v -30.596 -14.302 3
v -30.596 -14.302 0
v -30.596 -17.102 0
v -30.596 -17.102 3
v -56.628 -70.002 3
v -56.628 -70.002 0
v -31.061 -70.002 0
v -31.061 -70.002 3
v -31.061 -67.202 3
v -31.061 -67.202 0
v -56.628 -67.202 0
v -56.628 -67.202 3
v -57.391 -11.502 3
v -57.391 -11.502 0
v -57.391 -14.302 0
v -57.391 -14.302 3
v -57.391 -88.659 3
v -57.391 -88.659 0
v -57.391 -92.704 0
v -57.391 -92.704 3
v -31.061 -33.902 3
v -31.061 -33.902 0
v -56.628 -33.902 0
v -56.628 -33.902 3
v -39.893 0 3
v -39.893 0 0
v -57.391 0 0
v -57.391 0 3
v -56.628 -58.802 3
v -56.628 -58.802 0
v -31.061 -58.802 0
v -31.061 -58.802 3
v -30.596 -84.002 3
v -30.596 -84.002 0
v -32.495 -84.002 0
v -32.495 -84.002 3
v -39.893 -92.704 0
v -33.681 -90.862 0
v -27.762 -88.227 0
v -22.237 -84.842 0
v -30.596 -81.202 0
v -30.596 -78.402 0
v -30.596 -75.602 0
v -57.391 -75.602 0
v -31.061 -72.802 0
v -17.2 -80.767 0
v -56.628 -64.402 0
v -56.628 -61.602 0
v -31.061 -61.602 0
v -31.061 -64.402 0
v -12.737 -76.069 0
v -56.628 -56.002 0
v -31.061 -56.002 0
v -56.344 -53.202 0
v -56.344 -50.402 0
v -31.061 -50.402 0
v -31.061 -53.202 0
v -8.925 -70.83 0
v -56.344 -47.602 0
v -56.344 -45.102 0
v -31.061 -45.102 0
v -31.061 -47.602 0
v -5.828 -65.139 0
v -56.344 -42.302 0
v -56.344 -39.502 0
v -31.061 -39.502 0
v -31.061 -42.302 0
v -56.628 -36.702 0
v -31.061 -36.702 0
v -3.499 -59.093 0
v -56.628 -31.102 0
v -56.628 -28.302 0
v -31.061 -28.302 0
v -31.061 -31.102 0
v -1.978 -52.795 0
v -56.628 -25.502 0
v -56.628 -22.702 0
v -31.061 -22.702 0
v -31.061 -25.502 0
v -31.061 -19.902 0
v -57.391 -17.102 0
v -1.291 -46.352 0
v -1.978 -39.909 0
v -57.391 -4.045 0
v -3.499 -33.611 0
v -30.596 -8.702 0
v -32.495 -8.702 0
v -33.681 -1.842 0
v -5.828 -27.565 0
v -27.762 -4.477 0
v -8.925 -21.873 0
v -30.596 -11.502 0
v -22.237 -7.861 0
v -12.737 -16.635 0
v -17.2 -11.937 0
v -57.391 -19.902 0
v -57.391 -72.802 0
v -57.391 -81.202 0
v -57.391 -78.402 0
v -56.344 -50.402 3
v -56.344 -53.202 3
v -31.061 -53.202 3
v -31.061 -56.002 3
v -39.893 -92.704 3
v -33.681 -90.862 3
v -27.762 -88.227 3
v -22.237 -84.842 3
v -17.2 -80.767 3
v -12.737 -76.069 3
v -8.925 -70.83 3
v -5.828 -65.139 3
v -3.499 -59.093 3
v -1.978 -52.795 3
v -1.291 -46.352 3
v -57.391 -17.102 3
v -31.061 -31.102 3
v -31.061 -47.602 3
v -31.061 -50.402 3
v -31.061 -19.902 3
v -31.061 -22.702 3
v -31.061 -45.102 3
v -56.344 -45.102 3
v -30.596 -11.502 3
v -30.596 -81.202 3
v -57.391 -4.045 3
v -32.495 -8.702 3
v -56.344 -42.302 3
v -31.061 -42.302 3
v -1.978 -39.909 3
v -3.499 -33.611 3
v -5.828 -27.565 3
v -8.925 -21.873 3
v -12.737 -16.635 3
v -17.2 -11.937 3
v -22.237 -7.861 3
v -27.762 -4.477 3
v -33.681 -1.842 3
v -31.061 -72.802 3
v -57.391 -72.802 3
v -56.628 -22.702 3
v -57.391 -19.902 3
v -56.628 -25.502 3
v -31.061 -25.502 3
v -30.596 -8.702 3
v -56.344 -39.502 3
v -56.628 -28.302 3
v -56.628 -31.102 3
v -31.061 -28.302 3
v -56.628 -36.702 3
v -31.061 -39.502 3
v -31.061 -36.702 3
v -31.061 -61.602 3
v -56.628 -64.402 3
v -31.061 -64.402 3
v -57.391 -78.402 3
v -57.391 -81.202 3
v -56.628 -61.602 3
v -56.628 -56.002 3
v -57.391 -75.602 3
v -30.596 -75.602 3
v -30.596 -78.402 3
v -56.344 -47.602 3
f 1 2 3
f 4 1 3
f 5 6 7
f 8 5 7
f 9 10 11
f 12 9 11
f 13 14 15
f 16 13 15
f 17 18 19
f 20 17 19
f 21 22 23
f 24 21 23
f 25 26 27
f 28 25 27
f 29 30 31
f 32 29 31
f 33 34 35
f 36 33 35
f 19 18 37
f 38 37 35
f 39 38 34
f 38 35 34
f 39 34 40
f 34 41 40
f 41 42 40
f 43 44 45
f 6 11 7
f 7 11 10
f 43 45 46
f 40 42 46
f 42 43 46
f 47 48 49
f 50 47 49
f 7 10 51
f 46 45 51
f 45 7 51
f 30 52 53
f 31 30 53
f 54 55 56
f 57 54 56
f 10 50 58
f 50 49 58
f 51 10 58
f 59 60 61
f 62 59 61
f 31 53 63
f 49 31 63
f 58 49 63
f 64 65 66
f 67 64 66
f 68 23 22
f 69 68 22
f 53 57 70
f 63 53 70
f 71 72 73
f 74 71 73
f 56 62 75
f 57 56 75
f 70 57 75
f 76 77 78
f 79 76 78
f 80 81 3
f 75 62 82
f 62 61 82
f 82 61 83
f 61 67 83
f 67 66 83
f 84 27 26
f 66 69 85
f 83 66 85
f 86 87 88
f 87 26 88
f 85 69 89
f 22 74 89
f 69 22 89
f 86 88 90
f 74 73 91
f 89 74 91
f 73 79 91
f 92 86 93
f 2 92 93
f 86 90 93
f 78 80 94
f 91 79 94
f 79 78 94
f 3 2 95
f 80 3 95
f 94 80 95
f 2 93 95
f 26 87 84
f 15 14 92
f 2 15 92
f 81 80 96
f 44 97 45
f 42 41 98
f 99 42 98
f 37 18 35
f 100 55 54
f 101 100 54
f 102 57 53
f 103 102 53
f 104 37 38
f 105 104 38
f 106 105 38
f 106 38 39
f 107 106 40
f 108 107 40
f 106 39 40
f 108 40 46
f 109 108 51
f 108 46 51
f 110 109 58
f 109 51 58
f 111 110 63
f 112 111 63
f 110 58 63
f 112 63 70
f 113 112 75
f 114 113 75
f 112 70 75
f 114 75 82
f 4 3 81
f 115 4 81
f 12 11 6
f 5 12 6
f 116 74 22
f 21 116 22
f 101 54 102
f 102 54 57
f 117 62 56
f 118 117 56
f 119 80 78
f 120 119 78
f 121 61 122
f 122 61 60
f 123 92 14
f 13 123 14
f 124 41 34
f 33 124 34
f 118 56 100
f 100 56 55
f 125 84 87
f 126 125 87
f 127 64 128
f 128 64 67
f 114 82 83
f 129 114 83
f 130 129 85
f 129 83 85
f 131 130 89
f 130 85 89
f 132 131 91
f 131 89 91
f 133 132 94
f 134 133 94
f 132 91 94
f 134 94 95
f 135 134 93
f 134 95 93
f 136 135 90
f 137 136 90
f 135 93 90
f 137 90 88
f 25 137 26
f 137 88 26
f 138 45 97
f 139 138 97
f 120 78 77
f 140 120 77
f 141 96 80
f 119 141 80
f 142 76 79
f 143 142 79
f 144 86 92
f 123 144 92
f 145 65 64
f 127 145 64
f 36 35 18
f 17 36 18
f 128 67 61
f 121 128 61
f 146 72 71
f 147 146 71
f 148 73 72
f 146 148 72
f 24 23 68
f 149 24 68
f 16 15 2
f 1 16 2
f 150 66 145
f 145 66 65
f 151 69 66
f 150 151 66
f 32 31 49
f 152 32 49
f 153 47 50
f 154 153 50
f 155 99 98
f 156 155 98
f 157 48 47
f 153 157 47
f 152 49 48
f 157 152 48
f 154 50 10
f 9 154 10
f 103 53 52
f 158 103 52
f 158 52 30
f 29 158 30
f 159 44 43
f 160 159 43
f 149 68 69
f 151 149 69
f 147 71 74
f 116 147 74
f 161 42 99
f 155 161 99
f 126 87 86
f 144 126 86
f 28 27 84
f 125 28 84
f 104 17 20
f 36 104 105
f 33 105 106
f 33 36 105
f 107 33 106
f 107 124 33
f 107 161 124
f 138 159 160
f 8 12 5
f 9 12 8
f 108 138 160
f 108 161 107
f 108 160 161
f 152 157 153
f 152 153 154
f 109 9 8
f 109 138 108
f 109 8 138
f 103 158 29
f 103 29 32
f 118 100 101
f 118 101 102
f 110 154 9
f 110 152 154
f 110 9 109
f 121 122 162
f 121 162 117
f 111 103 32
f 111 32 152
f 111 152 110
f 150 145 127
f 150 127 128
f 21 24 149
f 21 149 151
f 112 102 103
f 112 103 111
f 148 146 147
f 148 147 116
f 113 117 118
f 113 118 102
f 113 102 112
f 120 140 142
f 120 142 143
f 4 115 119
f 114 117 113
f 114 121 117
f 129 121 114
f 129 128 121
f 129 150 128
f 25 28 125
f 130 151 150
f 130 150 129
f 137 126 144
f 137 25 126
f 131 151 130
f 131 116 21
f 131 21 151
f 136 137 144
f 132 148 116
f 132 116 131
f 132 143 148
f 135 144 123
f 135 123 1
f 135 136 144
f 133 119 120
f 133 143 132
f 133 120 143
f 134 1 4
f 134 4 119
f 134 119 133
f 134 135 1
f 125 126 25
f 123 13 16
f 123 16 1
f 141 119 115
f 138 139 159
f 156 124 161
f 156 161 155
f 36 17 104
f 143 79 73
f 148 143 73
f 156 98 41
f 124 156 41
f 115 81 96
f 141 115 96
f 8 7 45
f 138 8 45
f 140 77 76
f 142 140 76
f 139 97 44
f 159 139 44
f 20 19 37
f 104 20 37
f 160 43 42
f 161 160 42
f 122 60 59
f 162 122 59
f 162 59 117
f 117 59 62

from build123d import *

# Parameters (mm, degrees)
F1_DEPTH = 3


with BuildPart() as f1:
    # F0 (on Top) → F1 (new body)
    with BuildSketch(Plane.XY):
        with BuildLine():
            Line((-39.892867, 0), (-57.391304, 0))
            Line((-57.391304, 0), (-57.391304, -4.045027))
            Line((-57.391304, -4.045027), (-32.494808, -8.701925))
            Line((-32.494808, -8.701925), (-30.596264, -8.701925))
            Line((-30.596264, -8.701925), (-30.596264, -11.501925))
            Line((-30.596264, -11.501925), (-57.391304, -11.501925))
            Line((-57.391304, -11.501925), (-57.391304, -14.301925))
            Line((-57.391304, -14.301925), (-30.596264, -14.301925))
            Line((-30.596264, -14.301925), (-30.596264, -17.101925))
            Line((-30.596264, -17.101925), (-57.391304, -17.101925))
            Line((-57.391304, -17.101925), (-57.391304, -19.901925))
            Line((-57.391304, -19.901925), (-31.060893, -19.901925))
            Line((-31.060893, -19.901925), (-31.060893, -22.701925))
            Line((-31.060893, -22.701925), (-56.627642, -22.701925))
            Line((-56.627642, -22.701925), (-56.627642, -25.501925))
            Line((-56.627642, -25.501925), (-31.060893, -25.501925))
            Line((-31.060893, -25.501925), (-31.060893, -28.301925))
            Line((-31.060893, -28.301925), (-56.627642, -28.301925))
            Line((-56.627642, -28.301925), (-56.627642, -31.101925))
            Line((-56.627642, -31.101925), (-31.060893, -31.101925))
            Line((-31.060893, -31.101925), (-31.060893, -33.901925))
            Line((-31.060893, -33.901925), (-56.627642, -33.901925))
            Line((-56.627642, -33.901925), (-56.627642, -36.701925))
            Line((-56.627642, -36.701925), (-31.060893, -36.701925))
            Line((-31.060893, -36.701925), (-31.060893, -39.501925))
            Line((-31.060893, -39.501925), (-56.34404, -39.501925))
            Line((-56.34404, -39.501925), (-56.34404, -42.301925))
            Line((-56.34404, -42.301925), (-31.060893, -42.301925))
            Line((-31.060893, -42.301925), (-31.060893, -45.101925))
            Line((-31.060893, -45.101925), (-56.34404, -45.101925))
            Line((-56.34404, -45.101925), (-56.34404, -46.351925))
            Line((-56.34404, -46.351925), (-56.34404, -47.601925))
            Line((-56.34404, -47.601925), (-31.060893, -47.601925))
            Line((-31.060893, -47.601925), (-31.060893, -50.401925))
            Line((-31.060893, -50.401925), (-56.34404, -50.401925))
            Line((-56.34404, -50.401925), (-56.34404, -53.201925))
            Line((-56.34404, -53.201925), (-31.060893, -53.201925))
            Line((-31.060893, -53.201925), (-31.060893, -56.001925))
            Line((-31.060893, -56.001925), (-56.627642, -56.001925))
            Line((-56.627642, -56.001925), (-56.627642, -58.801925))
            Line((-56.627642, -58.801925), (-31.060893, -58.801925))
            Line((-31.060893, -58.801925), (-31.060893, -61.601925))
            Line((-31.060893, -61.601925), (-56.627642, -61.601925))
            Line((-56.627642, -61.601925), (-56.627642, -64.401925))
            Line((-56.627642, -64.401925), (-31.060893, -64.401925))
            Line((-31.060893, -64.401925), (-31.060893, -67.201925))
            Line((-31.060893, -67.201925), (-56.627642, -67.201925))
            Line((-56.627642, -67.201925), (-56.627642, -70.001925))
            Line((-56.627642, -70.001925), (-31.060893, -70.001925))
            Line((-31.060893, -70.001925), (-31.060893, -72.801925))
            Line((-31.060893, -72.801925), (-57.391304, -72.801925))
            Line((-57.391304, -72.801925), (-57.391304, -75.601925))
            Line((-57.391304, -75.601925), (-30.596264, -75.601925))
            Line((-30.596264, -75.601925), (-30.596264, -78.401925))
            Line((-30.596264, -78.401925), (-57.391304, -78.401925))
            Line((-57.391304, -78.401925), (-57.391304, -81.201925))
            Line((-57.391304, -81.201925), (-30.596264, -81.201925))
            Line((-30.596264, -81.201925), (-30.596264, -84.001925))
            Line((-30.596264, -84.001925), (-32.494808, -84.001925))
            Line((-32.494808, -84.001925), (-57.391304, -88.658823))
            Line((-57.391304, -88.658823), (-57.391304, -92.70385))
            Line((-57.391304, -92.70385), (-39.892867, -92.70385))
            ThreePointArc((-39.892867, -92.70385), (-12.737124, -76.069348), (-1.29091, -46.351925))
            ThreePointArc((-1.29091, -46.351925), (-12.737124, -16.634502), (-39.892867, 0))
        make_face()
    extrude(amount=F1_DEPTH)


solid = f1.part
